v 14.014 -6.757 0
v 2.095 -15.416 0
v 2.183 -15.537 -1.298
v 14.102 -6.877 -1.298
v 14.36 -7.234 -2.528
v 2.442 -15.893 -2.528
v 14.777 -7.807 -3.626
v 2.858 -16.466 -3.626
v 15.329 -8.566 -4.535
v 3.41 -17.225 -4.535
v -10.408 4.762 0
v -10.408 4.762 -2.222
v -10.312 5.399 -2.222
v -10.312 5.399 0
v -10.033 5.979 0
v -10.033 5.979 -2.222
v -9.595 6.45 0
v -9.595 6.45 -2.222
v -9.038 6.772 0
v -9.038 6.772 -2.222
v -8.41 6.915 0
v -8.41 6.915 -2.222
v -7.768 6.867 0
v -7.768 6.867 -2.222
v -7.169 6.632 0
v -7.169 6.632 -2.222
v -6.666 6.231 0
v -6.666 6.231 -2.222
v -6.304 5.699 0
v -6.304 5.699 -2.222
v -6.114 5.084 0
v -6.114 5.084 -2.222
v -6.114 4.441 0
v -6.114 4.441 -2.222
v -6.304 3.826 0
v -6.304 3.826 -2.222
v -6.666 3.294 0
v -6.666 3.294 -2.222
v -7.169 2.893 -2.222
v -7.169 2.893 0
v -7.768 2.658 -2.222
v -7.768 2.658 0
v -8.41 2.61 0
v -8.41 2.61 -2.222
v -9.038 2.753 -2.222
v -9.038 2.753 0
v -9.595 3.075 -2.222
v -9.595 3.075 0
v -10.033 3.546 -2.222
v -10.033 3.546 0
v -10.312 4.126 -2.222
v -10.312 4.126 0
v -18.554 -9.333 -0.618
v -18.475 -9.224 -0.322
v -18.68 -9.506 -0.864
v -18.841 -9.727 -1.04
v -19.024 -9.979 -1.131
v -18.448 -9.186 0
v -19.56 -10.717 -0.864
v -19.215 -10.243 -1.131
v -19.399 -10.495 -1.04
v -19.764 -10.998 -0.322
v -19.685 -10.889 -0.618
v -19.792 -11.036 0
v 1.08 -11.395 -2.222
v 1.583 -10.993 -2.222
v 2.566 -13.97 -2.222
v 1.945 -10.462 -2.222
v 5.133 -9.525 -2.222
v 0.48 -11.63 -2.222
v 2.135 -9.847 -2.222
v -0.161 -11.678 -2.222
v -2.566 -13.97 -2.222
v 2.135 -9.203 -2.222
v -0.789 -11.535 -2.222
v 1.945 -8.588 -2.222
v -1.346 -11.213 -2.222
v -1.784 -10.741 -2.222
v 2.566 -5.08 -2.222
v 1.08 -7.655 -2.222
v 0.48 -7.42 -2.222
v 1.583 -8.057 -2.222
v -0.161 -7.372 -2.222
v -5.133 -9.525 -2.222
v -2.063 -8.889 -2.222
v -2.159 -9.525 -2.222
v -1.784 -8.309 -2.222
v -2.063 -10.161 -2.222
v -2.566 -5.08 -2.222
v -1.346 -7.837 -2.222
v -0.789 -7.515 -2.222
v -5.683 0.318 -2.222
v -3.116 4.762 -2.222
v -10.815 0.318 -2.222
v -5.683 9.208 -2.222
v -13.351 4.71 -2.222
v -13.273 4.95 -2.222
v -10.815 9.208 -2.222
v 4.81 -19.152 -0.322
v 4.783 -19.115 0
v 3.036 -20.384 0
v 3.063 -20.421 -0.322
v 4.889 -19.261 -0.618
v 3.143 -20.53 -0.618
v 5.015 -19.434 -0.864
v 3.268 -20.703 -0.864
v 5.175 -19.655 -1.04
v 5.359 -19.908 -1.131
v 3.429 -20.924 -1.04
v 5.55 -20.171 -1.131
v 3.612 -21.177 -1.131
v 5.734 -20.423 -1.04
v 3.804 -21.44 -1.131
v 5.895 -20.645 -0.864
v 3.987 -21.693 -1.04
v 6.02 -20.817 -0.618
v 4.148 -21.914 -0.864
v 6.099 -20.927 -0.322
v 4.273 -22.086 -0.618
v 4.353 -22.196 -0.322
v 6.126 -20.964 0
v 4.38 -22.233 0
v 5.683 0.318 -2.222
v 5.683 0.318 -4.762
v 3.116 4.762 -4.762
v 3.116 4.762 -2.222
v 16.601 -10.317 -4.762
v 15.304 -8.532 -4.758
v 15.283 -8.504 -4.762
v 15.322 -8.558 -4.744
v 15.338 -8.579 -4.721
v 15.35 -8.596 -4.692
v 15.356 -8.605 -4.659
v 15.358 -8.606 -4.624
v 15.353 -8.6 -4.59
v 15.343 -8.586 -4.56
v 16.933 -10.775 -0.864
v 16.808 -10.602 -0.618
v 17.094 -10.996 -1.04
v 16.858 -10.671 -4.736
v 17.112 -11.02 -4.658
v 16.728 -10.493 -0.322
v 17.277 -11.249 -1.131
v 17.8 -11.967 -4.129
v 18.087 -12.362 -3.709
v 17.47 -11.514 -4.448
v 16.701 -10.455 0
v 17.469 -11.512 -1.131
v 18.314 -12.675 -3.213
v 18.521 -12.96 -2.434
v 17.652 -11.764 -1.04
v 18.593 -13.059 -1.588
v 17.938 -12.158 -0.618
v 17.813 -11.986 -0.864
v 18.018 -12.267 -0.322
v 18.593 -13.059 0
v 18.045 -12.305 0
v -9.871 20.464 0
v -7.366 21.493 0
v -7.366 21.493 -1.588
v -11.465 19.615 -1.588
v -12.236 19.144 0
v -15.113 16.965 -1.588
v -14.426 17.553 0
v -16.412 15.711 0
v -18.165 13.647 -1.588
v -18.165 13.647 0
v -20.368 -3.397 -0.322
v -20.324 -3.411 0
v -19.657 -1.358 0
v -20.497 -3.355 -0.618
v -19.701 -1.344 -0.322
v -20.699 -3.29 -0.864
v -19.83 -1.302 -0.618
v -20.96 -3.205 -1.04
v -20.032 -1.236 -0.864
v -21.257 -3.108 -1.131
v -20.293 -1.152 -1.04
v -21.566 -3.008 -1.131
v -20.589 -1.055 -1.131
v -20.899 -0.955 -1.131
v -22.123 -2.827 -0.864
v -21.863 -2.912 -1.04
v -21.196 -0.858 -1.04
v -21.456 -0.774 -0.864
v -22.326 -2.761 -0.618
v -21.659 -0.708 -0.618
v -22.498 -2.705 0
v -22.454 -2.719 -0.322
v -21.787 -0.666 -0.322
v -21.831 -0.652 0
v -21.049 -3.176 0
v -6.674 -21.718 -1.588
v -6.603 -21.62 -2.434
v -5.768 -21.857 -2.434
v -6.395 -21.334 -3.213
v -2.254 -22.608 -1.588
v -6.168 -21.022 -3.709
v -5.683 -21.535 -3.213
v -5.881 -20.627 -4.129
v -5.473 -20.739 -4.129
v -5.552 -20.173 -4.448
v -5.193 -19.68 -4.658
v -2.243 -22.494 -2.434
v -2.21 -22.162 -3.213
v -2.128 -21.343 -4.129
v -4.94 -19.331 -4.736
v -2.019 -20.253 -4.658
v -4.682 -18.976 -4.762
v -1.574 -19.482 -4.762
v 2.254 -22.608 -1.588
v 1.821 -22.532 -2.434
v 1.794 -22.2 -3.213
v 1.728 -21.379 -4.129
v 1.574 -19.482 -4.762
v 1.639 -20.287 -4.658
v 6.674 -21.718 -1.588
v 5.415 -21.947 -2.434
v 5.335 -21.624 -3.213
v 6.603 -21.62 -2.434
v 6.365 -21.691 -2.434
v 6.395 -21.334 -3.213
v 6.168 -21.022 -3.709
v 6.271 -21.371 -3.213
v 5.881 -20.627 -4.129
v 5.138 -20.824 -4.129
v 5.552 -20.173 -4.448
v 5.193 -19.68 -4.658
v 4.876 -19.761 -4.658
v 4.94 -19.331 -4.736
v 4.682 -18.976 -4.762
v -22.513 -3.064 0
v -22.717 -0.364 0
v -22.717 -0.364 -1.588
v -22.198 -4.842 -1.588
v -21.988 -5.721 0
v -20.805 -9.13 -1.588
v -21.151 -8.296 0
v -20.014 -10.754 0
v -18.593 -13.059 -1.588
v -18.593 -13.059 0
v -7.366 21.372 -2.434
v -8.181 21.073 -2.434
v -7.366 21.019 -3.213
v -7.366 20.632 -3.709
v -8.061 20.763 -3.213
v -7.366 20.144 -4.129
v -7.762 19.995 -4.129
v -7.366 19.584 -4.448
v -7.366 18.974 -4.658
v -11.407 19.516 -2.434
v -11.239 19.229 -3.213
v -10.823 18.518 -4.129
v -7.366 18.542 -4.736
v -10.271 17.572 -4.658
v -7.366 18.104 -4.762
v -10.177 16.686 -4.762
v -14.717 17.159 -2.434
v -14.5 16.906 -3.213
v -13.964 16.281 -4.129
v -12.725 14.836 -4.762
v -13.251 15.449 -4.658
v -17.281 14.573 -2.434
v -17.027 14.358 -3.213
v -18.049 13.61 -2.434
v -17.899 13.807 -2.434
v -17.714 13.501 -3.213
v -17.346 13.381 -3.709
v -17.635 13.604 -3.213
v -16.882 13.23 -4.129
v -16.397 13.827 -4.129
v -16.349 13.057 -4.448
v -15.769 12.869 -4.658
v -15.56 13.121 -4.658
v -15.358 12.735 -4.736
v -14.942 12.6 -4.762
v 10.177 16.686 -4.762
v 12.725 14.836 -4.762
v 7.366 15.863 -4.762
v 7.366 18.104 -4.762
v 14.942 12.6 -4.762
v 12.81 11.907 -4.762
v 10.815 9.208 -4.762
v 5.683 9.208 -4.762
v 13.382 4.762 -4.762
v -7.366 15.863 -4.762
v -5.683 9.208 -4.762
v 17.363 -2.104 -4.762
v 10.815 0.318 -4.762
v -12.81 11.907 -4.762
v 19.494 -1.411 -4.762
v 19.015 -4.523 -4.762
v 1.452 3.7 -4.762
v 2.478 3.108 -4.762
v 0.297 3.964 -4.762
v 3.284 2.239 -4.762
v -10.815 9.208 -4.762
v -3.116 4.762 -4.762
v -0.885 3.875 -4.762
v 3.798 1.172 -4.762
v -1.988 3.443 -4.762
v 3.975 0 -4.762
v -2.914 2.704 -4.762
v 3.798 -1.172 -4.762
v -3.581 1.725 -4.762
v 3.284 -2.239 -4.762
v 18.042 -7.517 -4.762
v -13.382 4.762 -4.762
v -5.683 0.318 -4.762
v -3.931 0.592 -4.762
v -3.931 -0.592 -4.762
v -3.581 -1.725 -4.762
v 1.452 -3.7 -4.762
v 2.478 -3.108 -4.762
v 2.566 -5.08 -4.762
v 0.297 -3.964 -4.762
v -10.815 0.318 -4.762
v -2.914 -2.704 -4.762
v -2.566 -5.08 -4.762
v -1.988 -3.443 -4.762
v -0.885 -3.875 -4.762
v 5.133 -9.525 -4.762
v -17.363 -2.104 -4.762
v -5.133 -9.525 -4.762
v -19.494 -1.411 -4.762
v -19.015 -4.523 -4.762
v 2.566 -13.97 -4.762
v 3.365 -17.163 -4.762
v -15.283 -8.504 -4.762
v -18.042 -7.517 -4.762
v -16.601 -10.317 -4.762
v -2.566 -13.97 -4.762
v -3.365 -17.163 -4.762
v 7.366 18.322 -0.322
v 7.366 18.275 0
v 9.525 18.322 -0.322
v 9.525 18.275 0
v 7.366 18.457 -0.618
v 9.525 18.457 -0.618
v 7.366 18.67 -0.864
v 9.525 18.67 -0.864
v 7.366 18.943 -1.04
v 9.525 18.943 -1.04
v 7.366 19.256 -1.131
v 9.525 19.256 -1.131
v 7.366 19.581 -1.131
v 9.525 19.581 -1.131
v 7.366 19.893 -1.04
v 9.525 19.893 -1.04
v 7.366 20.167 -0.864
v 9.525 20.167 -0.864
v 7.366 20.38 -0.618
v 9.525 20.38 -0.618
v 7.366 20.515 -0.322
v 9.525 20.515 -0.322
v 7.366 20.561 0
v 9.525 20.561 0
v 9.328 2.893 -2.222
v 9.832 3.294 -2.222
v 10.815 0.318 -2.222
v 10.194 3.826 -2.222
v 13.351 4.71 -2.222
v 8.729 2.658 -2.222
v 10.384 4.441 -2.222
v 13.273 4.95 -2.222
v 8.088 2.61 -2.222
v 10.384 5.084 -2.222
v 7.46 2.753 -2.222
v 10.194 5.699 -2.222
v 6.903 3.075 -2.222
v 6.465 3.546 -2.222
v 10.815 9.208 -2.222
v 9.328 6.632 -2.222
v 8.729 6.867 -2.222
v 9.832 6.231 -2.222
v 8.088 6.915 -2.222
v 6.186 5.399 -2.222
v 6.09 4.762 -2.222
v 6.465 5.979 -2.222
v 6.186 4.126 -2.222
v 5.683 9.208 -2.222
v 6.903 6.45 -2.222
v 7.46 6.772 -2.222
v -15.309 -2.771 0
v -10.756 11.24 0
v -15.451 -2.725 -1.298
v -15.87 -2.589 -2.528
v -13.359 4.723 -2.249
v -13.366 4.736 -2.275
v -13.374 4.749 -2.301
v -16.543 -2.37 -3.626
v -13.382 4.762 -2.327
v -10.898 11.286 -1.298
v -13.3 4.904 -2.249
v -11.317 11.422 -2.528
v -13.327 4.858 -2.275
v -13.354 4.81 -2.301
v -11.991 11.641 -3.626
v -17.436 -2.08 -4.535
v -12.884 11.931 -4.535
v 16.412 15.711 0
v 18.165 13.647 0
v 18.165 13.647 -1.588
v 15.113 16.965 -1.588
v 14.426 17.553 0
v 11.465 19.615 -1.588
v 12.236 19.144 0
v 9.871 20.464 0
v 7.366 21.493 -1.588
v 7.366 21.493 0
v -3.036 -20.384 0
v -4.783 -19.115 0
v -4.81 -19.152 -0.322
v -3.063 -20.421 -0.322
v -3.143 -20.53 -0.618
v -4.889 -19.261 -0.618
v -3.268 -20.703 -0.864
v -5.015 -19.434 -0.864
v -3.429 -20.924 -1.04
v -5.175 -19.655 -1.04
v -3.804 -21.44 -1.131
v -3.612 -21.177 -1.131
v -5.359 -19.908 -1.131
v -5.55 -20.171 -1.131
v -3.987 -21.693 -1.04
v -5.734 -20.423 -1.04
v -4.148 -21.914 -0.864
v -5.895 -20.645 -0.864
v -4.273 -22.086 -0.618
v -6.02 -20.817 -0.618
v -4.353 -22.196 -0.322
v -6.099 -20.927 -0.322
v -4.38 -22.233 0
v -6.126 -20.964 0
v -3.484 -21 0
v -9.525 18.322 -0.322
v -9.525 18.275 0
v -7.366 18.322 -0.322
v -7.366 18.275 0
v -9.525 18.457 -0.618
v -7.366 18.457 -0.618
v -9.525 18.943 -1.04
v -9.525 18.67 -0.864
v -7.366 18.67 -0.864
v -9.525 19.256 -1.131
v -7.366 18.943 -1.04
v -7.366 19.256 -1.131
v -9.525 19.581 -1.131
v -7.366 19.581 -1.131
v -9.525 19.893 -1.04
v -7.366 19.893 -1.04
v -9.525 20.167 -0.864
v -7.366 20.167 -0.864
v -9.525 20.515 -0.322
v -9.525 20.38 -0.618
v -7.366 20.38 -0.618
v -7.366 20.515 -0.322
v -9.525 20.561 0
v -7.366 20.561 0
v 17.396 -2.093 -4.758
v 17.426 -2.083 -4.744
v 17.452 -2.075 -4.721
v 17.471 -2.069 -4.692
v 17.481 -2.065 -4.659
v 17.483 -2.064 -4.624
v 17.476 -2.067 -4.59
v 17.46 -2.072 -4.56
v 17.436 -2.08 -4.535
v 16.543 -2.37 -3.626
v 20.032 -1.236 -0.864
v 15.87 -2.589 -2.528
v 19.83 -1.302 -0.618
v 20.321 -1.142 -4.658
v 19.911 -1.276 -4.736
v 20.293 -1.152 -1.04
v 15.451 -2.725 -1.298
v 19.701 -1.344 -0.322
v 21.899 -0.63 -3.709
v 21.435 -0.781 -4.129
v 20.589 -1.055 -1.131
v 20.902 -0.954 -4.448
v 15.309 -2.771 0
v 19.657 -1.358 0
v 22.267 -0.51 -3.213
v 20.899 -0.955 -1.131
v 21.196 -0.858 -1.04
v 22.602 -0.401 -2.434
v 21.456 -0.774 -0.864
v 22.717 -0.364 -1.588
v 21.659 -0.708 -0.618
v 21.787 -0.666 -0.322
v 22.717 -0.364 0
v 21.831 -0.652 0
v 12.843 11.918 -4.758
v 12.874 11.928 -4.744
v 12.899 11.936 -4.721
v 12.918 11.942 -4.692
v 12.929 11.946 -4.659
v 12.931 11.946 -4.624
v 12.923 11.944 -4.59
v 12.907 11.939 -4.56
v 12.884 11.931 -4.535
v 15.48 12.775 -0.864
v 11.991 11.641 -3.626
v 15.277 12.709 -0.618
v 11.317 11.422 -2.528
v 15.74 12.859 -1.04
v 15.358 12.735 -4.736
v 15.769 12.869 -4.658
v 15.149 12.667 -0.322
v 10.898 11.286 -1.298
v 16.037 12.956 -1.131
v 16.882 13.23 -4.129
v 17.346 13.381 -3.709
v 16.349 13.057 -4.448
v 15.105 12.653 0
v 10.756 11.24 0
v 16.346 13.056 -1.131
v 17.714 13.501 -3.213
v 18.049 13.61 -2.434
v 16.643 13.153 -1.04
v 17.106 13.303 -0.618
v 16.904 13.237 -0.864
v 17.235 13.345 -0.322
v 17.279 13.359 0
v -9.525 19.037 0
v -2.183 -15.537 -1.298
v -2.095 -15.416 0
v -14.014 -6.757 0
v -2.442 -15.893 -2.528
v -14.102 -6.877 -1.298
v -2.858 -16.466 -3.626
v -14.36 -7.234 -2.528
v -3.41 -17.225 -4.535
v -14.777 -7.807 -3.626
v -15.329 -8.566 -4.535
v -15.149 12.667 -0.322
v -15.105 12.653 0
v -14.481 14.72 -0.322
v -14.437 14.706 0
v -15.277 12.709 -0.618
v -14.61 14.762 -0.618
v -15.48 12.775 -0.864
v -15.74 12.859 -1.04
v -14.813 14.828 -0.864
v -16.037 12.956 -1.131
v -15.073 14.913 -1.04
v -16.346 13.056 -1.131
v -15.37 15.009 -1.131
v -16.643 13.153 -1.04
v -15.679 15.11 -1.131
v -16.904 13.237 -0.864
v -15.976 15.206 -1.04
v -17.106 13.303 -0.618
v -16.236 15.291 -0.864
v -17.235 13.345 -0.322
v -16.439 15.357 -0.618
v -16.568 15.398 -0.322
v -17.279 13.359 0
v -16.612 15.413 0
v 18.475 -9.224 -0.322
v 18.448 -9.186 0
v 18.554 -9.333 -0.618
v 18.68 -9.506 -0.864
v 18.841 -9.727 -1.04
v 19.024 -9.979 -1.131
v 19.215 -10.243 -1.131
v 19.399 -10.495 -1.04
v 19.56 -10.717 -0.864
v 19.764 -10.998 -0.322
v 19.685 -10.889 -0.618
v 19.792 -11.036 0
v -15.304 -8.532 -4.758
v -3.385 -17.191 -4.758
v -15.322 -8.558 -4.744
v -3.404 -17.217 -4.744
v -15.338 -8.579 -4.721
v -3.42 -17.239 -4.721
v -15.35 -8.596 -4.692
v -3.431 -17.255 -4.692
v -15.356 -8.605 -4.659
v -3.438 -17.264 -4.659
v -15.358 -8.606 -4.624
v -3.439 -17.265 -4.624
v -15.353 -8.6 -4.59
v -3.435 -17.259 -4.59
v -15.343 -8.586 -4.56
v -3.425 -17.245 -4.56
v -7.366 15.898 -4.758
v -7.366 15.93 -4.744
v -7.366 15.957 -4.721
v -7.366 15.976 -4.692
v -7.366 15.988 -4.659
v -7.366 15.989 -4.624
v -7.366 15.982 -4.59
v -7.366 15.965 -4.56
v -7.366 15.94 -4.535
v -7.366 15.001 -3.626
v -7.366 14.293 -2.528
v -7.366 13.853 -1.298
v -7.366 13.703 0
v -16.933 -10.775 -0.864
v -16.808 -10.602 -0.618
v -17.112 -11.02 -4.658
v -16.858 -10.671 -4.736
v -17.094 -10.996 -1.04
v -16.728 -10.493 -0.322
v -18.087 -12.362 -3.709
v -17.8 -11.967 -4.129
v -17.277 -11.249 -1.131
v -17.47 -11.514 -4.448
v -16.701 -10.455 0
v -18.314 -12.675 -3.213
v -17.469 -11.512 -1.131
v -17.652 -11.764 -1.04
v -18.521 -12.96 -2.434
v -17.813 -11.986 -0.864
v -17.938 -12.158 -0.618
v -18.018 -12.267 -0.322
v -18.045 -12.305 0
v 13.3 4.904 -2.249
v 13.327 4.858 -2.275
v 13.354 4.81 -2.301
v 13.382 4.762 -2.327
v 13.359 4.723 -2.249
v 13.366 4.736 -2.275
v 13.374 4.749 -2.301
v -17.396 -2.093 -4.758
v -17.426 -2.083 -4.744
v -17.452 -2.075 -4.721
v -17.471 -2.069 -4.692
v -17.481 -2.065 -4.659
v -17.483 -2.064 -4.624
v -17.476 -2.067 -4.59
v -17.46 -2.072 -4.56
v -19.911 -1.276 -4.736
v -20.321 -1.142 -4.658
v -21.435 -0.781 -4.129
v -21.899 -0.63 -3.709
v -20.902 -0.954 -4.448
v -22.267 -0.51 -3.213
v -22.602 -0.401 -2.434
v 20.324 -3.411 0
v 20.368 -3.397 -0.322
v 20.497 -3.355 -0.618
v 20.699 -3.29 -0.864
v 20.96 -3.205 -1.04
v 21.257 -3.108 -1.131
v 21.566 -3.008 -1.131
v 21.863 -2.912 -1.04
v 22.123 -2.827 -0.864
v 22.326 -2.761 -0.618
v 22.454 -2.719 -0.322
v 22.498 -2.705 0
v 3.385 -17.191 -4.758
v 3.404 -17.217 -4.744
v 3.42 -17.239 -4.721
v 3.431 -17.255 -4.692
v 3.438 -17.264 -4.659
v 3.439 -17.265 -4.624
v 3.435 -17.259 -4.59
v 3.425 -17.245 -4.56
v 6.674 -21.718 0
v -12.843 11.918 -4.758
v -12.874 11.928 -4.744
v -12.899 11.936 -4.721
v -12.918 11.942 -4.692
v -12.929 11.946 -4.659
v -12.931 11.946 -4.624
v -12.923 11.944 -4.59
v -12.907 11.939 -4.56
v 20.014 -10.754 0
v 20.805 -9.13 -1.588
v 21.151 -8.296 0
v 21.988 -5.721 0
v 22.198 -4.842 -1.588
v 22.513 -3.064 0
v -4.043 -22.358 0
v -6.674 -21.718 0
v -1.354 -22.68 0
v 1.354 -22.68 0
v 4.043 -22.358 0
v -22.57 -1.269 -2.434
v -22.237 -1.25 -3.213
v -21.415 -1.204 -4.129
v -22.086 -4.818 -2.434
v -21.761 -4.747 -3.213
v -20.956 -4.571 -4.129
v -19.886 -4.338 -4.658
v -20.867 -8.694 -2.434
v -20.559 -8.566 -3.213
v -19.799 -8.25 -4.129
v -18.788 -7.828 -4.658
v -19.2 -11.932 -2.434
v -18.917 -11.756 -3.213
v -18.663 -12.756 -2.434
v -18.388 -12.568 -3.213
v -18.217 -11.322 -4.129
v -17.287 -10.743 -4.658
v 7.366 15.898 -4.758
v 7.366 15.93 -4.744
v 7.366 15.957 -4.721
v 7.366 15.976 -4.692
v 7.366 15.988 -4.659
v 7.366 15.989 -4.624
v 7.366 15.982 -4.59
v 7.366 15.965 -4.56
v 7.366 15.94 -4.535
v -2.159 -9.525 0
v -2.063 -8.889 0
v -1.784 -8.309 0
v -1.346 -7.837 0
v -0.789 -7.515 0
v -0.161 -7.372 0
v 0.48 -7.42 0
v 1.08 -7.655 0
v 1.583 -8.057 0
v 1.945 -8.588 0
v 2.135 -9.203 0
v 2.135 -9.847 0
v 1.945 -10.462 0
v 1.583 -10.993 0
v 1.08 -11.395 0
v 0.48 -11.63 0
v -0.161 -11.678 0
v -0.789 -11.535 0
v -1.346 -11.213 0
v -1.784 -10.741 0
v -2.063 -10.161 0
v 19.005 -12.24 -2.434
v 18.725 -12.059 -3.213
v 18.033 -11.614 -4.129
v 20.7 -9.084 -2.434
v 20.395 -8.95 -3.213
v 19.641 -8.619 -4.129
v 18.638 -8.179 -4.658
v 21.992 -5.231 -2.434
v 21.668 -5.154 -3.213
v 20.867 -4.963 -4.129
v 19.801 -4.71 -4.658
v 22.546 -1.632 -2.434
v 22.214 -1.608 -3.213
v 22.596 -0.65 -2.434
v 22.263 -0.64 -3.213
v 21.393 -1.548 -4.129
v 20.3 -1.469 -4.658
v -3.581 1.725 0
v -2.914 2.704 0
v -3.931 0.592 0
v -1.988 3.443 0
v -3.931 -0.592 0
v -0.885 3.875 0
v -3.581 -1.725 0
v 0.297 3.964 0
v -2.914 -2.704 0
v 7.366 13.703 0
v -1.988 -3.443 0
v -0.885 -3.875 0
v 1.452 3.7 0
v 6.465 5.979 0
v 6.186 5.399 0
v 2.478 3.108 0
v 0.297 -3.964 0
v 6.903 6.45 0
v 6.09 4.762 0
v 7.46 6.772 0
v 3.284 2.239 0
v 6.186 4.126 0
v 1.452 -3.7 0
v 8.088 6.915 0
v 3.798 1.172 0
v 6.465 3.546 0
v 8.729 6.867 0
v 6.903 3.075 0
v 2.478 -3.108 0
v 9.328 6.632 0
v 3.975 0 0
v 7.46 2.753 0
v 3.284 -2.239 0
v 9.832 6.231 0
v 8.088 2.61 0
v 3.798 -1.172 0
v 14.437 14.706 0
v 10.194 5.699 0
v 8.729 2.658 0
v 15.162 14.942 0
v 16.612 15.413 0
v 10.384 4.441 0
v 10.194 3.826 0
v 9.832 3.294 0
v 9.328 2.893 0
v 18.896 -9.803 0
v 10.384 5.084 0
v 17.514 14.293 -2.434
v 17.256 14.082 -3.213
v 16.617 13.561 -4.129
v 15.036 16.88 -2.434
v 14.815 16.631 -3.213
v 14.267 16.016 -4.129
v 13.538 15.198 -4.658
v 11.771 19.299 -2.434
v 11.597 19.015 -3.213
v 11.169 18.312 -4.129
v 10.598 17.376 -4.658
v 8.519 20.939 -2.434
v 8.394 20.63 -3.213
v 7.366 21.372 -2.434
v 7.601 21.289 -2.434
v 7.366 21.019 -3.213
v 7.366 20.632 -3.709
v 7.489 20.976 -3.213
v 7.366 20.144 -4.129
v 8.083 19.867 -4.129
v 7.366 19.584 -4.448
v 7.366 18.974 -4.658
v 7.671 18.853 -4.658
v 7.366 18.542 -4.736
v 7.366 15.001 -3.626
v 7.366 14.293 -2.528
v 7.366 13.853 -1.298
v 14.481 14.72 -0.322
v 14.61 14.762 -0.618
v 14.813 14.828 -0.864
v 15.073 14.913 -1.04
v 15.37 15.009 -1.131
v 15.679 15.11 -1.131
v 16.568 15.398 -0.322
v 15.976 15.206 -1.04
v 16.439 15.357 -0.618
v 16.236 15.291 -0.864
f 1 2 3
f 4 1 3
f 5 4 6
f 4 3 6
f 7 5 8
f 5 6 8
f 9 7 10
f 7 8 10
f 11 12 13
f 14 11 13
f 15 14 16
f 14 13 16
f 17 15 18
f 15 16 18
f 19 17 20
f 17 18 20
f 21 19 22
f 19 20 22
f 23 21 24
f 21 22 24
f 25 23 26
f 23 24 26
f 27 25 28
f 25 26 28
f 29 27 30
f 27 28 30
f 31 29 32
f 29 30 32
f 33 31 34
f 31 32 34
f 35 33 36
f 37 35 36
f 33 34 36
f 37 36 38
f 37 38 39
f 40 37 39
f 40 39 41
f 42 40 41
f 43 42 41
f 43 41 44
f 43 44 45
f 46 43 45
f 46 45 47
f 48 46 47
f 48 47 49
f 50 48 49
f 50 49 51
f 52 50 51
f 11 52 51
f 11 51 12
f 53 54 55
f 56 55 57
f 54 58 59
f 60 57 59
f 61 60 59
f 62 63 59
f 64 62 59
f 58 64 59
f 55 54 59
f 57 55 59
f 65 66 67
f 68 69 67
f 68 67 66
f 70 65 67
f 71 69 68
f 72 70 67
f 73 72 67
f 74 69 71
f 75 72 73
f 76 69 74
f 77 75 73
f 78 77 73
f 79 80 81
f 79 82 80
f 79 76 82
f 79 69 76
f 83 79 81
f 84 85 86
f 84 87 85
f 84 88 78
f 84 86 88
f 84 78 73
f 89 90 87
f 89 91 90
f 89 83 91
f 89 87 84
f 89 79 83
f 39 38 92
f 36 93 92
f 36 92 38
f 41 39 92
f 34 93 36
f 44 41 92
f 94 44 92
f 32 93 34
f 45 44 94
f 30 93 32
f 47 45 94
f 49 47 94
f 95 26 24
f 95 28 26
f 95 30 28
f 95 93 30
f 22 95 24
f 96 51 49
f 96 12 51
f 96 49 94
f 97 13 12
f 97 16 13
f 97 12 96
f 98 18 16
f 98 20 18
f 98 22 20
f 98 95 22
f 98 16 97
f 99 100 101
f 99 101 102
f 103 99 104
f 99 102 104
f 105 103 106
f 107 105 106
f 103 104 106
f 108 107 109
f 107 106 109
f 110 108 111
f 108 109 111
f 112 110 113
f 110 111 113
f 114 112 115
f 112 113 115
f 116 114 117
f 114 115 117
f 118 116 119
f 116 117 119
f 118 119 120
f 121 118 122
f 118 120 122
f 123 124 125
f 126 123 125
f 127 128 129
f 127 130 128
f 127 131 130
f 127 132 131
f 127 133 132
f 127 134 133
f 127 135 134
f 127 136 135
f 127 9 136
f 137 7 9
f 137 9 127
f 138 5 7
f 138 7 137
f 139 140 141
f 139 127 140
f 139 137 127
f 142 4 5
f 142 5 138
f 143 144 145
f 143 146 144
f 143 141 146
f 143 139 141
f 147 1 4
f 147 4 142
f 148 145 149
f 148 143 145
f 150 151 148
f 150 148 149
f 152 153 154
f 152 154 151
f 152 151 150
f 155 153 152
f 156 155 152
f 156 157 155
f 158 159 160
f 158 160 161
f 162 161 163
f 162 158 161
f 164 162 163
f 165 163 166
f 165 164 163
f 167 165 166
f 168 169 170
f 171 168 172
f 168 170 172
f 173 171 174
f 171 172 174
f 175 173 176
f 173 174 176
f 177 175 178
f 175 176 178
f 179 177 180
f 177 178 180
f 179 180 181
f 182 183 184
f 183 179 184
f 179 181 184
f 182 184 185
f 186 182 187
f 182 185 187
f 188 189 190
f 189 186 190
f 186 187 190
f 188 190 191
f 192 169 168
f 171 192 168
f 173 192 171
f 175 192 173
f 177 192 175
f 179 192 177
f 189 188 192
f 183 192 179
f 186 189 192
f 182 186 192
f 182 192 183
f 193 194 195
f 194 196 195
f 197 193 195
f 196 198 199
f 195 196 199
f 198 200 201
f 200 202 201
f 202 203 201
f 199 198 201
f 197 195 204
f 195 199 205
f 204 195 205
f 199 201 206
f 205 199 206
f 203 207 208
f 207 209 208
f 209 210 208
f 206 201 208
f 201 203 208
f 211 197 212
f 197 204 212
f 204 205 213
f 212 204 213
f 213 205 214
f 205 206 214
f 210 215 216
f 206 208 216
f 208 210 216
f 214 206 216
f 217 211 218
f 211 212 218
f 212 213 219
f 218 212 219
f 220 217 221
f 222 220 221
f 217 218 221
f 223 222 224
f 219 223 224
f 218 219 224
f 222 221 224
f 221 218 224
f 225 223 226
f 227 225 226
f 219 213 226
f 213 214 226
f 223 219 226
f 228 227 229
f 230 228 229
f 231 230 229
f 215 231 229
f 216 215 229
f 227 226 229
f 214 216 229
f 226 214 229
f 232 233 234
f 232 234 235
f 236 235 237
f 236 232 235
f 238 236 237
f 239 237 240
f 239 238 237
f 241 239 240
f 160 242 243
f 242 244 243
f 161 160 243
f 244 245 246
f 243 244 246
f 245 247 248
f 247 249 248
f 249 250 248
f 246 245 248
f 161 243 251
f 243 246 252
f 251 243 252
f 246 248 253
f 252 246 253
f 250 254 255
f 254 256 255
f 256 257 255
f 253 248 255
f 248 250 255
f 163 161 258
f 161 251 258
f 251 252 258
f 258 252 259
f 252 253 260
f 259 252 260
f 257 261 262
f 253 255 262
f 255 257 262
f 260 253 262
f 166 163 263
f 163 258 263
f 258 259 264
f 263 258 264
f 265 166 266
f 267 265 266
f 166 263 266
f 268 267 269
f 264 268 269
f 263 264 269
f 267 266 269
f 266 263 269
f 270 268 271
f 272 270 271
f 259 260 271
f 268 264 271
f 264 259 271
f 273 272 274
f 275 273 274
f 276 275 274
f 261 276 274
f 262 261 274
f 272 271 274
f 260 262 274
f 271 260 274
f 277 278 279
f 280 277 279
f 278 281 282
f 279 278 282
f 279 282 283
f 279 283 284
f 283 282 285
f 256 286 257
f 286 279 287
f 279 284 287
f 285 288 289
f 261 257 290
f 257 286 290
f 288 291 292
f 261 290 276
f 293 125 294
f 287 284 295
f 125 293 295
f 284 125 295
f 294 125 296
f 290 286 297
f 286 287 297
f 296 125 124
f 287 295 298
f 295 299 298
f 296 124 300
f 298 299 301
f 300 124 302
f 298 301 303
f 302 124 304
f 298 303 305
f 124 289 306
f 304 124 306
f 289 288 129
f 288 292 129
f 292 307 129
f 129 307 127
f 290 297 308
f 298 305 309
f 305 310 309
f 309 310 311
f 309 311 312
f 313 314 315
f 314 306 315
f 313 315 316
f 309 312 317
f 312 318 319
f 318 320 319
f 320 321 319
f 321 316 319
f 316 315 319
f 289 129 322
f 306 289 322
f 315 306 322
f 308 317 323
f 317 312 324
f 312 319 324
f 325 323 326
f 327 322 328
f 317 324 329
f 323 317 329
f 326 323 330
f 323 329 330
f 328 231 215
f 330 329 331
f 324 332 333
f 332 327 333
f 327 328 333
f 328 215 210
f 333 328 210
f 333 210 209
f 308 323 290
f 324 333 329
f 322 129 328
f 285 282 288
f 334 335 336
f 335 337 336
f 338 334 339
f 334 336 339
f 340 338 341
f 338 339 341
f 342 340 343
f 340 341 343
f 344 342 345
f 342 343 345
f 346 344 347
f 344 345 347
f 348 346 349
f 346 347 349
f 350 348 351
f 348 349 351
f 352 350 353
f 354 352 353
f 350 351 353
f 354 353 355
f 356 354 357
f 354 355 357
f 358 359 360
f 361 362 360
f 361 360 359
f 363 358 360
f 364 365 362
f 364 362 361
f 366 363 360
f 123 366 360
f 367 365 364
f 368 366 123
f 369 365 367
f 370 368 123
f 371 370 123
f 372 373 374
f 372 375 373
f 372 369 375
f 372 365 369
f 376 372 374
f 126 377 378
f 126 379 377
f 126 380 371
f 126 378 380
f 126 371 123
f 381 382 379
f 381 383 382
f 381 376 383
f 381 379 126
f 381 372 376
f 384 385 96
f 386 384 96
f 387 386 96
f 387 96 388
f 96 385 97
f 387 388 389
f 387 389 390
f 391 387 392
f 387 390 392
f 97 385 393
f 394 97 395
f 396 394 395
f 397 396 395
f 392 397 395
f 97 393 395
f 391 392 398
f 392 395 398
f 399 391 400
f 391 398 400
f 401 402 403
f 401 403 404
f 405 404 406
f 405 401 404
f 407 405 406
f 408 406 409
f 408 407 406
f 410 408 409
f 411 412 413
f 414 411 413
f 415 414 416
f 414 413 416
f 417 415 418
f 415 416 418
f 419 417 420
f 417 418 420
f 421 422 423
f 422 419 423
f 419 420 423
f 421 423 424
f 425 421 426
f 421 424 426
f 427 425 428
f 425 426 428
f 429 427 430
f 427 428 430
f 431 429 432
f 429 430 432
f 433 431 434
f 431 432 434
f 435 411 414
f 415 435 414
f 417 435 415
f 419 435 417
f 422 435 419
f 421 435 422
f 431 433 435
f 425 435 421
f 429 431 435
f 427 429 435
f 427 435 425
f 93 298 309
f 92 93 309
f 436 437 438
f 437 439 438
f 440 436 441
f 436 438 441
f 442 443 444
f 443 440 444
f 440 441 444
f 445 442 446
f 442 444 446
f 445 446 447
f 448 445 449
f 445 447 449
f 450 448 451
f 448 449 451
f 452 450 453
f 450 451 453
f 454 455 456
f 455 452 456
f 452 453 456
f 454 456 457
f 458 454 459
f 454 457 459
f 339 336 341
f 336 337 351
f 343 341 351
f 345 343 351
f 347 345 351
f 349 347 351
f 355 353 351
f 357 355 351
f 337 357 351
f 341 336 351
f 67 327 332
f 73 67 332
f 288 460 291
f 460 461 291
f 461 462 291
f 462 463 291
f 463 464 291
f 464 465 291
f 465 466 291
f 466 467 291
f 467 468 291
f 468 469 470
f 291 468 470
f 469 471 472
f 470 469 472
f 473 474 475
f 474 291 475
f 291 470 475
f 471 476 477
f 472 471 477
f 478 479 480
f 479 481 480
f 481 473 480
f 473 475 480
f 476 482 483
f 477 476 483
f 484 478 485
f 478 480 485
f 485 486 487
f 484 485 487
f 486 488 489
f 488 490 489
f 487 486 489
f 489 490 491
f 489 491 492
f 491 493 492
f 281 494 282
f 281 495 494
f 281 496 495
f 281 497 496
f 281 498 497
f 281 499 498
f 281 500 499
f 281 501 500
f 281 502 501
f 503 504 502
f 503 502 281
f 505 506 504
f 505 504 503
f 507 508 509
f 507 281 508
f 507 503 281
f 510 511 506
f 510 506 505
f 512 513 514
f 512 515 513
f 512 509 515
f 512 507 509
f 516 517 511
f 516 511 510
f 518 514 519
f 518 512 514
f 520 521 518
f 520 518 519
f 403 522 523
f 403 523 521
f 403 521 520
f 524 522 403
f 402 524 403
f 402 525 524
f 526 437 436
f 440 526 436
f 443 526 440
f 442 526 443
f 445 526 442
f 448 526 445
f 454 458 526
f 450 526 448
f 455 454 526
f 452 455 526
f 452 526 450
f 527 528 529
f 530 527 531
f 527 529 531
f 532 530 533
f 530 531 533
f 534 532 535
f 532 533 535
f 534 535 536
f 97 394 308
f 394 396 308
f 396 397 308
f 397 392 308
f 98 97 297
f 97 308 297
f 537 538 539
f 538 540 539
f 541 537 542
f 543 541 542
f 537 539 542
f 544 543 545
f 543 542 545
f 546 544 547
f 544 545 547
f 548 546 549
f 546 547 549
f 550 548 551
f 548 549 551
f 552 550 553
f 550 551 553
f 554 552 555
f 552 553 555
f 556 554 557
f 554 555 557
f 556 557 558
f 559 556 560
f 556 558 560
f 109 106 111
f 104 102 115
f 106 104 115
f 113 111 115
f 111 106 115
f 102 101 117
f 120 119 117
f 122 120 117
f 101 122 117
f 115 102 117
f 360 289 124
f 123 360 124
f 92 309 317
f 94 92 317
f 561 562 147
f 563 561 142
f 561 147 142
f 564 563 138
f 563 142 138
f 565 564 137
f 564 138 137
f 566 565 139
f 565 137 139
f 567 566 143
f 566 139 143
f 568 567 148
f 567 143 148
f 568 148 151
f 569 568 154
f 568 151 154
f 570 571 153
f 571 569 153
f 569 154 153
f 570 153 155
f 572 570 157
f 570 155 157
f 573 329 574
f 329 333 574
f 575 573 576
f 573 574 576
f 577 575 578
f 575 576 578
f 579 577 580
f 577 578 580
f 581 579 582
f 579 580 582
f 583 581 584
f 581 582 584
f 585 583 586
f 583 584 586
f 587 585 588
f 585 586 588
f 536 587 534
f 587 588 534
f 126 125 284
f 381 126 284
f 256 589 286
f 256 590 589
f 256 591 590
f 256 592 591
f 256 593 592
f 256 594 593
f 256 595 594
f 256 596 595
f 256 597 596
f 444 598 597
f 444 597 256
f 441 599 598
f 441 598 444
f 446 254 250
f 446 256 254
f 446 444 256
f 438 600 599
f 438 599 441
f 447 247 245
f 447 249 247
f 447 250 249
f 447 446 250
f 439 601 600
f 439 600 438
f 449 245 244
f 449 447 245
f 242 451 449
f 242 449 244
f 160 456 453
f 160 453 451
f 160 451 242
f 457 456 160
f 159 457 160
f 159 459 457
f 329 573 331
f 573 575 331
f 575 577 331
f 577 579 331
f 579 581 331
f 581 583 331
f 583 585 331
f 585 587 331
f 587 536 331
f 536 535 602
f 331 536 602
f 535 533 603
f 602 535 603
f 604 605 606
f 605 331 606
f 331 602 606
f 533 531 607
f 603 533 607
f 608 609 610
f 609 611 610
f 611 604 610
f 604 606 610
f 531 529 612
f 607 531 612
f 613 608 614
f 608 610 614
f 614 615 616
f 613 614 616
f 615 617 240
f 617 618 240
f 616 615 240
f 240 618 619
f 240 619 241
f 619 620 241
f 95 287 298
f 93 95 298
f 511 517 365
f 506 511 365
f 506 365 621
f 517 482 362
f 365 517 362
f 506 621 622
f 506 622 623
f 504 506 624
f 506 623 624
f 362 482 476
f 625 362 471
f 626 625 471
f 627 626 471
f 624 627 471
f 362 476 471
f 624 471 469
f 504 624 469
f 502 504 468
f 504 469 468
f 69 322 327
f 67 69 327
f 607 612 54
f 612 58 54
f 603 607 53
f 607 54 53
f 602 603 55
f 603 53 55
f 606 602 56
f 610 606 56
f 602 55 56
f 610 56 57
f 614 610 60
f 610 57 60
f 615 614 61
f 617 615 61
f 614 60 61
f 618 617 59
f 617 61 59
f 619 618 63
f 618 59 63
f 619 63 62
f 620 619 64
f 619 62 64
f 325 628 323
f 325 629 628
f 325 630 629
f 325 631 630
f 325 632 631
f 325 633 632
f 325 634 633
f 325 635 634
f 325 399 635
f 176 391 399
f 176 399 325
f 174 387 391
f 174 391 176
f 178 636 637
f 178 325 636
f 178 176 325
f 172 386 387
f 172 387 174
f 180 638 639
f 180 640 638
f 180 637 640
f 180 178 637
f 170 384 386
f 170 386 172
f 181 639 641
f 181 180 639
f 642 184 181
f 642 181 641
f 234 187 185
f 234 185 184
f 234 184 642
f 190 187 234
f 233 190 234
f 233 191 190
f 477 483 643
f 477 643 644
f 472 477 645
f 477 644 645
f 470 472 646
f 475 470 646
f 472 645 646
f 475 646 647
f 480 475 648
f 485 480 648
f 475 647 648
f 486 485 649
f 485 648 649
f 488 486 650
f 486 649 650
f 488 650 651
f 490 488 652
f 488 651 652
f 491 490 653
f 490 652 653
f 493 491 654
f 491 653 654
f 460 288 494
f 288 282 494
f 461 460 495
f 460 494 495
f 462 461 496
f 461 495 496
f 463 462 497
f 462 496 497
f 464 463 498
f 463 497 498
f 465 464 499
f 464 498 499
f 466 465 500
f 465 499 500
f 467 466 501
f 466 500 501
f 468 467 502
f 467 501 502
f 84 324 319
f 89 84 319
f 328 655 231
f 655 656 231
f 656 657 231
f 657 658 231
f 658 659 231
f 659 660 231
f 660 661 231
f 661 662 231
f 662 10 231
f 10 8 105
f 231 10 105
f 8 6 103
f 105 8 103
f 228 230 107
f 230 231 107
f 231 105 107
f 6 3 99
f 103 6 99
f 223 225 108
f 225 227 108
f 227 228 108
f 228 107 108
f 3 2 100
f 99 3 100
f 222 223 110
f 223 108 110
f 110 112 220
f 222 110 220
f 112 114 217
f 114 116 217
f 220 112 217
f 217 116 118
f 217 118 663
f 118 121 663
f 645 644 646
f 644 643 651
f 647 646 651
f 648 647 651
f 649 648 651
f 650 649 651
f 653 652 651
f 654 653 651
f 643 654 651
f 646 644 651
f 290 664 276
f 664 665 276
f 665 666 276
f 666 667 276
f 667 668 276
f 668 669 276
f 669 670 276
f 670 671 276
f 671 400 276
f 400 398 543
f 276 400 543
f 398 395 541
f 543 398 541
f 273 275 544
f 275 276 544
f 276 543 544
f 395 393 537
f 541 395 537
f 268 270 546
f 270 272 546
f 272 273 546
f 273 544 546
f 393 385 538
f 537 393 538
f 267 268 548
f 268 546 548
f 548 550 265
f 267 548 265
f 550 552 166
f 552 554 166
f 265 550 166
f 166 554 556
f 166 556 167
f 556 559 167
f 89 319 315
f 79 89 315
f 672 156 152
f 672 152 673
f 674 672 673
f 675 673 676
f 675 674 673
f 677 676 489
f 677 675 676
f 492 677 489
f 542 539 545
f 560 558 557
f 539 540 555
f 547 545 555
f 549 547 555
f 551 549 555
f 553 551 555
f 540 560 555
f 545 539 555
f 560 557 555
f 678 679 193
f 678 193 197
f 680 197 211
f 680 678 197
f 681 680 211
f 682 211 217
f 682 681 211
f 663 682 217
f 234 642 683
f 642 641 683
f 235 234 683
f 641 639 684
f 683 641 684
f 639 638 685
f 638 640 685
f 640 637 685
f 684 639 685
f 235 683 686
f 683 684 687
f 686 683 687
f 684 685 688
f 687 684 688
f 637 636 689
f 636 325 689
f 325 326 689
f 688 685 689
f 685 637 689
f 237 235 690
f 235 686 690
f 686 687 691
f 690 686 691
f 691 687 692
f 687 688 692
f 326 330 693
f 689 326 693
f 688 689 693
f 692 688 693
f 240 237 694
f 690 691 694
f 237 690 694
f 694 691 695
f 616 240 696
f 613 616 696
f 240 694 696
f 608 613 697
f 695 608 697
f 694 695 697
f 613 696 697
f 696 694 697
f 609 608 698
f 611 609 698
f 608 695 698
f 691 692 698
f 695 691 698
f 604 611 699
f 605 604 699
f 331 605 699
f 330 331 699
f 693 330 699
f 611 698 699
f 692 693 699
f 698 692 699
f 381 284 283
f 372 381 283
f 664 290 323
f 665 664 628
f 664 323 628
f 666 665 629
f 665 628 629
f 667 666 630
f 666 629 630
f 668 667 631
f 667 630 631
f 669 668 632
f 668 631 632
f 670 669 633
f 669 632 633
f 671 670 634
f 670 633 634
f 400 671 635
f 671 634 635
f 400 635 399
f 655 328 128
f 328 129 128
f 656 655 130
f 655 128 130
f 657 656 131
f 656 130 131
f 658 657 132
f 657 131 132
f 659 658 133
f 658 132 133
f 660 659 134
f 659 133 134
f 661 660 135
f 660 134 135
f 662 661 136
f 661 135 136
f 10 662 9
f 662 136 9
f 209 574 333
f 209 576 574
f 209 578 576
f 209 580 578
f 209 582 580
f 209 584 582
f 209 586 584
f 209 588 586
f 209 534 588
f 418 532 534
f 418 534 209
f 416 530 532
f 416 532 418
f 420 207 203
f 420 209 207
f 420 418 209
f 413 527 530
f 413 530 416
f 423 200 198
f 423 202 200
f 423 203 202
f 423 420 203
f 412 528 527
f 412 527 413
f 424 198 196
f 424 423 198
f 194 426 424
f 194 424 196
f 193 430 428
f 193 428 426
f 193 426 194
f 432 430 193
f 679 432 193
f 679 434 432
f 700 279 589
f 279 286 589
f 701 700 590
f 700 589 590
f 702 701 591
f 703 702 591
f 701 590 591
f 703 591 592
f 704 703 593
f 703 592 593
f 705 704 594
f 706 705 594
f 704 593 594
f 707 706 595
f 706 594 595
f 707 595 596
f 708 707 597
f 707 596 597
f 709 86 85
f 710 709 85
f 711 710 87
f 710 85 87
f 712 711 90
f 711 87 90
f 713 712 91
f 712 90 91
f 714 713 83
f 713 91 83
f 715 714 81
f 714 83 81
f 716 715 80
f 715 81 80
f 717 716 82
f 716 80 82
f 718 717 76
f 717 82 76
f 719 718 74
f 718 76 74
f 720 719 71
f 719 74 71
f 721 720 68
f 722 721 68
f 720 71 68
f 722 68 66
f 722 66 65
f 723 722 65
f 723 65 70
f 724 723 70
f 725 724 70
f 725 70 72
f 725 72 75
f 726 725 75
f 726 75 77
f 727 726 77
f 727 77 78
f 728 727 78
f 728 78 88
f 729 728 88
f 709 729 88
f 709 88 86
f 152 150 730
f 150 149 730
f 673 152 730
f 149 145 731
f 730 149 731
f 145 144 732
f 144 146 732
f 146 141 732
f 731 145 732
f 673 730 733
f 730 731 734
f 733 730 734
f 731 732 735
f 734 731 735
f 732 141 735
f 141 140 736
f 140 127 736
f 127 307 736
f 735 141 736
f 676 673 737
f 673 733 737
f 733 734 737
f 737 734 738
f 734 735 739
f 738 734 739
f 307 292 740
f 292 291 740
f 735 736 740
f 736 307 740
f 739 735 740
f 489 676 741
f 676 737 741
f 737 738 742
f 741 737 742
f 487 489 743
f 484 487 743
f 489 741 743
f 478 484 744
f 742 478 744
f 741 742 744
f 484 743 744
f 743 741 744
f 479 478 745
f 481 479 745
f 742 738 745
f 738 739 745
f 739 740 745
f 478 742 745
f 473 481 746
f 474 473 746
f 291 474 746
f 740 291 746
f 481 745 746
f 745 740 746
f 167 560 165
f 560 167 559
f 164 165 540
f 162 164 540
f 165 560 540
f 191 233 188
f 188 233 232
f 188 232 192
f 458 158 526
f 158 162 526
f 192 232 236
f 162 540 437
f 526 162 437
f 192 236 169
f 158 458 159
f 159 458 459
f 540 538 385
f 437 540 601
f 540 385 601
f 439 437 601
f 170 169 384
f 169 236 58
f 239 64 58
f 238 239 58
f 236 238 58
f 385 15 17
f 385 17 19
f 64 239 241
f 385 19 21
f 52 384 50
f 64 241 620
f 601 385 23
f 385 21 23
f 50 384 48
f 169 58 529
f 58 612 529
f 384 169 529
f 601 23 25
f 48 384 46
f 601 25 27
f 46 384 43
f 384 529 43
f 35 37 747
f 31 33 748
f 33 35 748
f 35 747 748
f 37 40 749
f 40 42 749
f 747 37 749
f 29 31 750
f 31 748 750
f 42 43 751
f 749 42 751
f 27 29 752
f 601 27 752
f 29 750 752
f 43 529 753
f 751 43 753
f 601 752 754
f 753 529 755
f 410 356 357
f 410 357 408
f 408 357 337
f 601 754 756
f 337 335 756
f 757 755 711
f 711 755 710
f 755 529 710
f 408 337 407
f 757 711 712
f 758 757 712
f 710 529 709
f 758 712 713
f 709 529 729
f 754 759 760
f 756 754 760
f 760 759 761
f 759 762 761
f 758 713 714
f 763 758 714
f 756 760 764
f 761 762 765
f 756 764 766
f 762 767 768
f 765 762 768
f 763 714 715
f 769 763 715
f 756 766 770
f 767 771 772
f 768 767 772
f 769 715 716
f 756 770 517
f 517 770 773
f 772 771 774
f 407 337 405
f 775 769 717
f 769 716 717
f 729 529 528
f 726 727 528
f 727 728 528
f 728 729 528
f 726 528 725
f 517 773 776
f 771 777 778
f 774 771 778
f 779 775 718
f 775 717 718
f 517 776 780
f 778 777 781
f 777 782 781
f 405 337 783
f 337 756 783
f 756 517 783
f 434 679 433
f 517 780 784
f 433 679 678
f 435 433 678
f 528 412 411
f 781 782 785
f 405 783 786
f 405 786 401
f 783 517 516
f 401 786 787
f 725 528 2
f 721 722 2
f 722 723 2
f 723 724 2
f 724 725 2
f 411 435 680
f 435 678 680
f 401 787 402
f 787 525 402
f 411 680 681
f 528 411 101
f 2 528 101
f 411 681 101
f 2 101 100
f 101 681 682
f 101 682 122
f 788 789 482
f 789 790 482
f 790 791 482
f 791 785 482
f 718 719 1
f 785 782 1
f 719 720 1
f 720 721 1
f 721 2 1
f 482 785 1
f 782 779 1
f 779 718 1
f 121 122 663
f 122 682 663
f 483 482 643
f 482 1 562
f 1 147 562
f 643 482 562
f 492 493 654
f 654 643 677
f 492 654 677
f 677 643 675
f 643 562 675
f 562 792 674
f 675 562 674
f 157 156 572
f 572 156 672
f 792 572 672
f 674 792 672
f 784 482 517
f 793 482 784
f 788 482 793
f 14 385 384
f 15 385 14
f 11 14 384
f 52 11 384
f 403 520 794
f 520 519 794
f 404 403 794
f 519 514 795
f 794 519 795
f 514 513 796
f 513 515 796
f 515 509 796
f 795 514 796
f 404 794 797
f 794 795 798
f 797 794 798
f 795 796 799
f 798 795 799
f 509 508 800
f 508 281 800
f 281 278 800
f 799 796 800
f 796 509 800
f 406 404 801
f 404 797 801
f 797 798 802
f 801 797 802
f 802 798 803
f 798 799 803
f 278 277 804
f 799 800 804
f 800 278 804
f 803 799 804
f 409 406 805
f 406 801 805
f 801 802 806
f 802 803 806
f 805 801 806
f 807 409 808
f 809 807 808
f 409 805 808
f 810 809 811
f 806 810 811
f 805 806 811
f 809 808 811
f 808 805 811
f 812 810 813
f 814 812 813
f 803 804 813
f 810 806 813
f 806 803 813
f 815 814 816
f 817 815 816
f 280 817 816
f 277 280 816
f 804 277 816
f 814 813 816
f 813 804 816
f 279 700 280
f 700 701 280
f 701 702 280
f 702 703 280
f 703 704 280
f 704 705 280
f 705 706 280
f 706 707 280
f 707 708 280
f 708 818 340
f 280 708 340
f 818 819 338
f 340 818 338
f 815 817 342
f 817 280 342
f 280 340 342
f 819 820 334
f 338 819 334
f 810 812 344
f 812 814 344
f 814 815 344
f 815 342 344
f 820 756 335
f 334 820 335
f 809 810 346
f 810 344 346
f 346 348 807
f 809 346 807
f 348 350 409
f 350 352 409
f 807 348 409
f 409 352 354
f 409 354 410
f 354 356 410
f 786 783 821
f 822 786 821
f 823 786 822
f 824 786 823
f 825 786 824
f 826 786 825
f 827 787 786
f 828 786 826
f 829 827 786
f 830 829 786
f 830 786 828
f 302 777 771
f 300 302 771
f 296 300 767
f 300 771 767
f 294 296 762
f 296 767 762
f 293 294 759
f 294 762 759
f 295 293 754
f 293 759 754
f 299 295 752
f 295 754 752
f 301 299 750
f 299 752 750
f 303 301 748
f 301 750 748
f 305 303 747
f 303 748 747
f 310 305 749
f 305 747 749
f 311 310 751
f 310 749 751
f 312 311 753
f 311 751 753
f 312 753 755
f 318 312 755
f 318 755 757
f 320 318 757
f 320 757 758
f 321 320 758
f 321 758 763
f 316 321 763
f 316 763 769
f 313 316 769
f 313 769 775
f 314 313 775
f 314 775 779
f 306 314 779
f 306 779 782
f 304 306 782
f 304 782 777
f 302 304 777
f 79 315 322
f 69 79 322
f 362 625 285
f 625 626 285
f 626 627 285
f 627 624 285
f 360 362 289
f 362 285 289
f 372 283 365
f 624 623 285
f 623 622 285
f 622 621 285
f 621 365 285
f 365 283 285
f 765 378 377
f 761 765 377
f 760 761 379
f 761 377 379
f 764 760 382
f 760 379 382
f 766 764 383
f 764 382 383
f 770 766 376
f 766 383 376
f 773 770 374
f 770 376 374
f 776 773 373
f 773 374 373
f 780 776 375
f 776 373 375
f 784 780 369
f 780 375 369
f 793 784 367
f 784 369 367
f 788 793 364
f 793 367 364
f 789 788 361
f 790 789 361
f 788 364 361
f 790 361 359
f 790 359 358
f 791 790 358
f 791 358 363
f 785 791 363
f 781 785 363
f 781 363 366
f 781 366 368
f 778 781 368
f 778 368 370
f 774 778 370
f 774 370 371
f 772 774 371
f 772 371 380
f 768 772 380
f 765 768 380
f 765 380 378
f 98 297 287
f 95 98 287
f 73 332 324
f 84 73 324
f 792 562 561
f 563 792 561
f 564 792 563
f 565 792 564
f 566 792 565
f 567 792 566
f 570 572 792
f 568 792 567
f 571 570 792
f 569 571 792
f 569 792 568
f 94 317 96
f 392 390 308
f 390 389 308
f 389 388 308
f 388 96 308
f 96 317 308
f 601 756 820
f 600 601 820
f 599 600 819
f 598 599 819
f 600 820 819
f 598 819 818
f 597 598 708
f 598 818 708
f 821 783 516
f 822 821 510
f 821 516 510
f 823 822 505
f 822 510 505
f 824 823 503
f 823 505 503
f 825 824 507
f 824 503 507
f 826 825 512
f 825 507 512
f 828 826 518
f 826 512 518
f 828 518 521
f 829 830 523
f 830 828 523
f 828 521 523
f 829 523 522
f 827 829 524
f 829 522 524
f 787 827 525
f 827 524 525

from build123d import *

# Parameters (mm, degrees)
SKETCH1_R                = 22.7203
BOSS_EXTRUDE2_DEPTH      = 4.7625
FILLET1_R                = 3.175
SKETCH2_W                = 14.732
SKETCH2_H                = 10.414
CUT_EXTRUDE2_DEPTH       = 12.7
CIRPATTERN1_COUNT        = 5
SKETCH4_R                = 1.143
CUT_EXTRUDE4_DEPTH       = 9.525
CIRPATTERN2_COUNT        = 5
SKETCH5_R                = 3.9751
CUT_EXTRUDE5_DEPTH       = 33.480350535
SKETCH6_R                = 2.159
CUT_EXTRUDE7_DEPTH       = 33.480350535
BOSS_EXTRUDE4_REACH      = 39.999
FILLET2_R                = 0.127
CIRPATTERN5_COUNT        = 5
FILLET2_OF_CIRPATTERN5_R = 0.127
CUT_EXTRUDE8_DEPTH       = 2.54


with BuildPart() as part:
    # Sketch1 → Boss-Extrude2 (new body)
    with BuildSketch(Plane.XY):
        Circle(SKETCH1_R)
    extrude(amount=-BOSS_EXTRUDE2_DEPTH)

    # Fillet1
    fillet1_edges = [part.edges().sort_by_distance(p)[0] for p in [
        (-22.7203, 0, -4.7625),
    ]]
    fillet(fillet1_edges, radius=FILLET1_R)

    # Sketch2 → Cut-Extrude2 (cut)
    with BuildSketch(Plane.XY):
        with Locations((0, 18.7833)):
            Rectangle(SKETCH2_W, SKETCH2_H)
    cut_extrude2 = extrude(amount=-CUT_EXTRUDE2_DEPTH, mode=Mode.SUBTRACT)

    # CirPattern1: Cut-Extrude2 ×5 about axis
    cirpattern1_axis = Axis((0, 0, 0), (0, 0, 1))
    for i in range(1, CIRPATTERN1_COUNT):
        add(cut_extrude2.rotate(cirpattern1_axis, i * 360 / CIRPATTERN1_COUNT), mode=Mode.SUBTRACT)

    # Sketch4 → Cut-Extrude4 (cut, symmetric)
    with BuildSketch(Plane(origin=(0, 0, 0), x_dir=(0, 0, -1), z_dir=(1, 0, 0))):
        with Locations((0, 19.4183)):
            Circle(SKETCH4_R)
    cut_extrude4 = extrude(amount=CUT_EXTRUDE4_DEPTH, both=True, mode=Mode.SUBTRACT)

    # CirPattern2: Cut-Extrude4 ×5 about axis
    cirpattern2_axis = Axis((0, 0, 0), (0, 0, 1))
    for i in range(1, CIRPATTERN2_COUNT):
        add(cut_extrude4.rotate(cirpattern2_axis, i * 360 / CIRPATTERN2_COUNT), mode=Mode.SUBTRACT)

    # Sketch5 → Cut-Extrude5 (cut, through all)
    with BuildSketch(Plane.XY):
        Circle(SKETCH5_R)
    extrude(amount=-CUT_EXTRUDE5_DEPTH, mode=Mode.SUBTRACT)

    # Sketch6 → Cut-Extrude7 (cut, through all)
    with BuildSketch(Plane(origin=(0, 0, -4.7625), x_dir=(-1, 0, 0), z_dir=(0, 0, -1))):
        with Locations((0, -9.525)):
            Circle(SKETCH6_R)
        with Locations((-8.248891971, 4.7625)):
            Circle(SKETCH6_R)
        with Locations((8.248891971, 4.7625)):
            Circle(SKETCH6_R)
    extrude(amount=-CUT_EXTRUDE7_DEPTH, mode=Mode.SUBTRACT)

    # Sketch10 → Boss-Extrude4 (add, up to next)
    with BuildSketch(Plane.ZY.offset(-7.366), mode=Mode.PRIVATE) as boss_extrude4_sk1:
        with BuildLine():
            Line((-4.7625, 13.5763), (0, 13.5763))
            Line((0, 13.5763), (0, 13.7033))
            ThreePointArc((0, 13.7033), (-2.7025038, 14.38265722), (-4.7625, 16.259214887))
            Line((-4.7625, 16.259214887), (-4.7625, 13.5763))
        make_face()
    boss_extrude4_tool1 = extrude(boss_extrude4_sk1.sketch, amount=BOSS_EXTRUDE4_REACH, mode=Mode.PRIVATE) - part.part
    boss_extrude4 = boss_extrude4_tool1.solids().sort_by_distance((7.366, 14.314807, -3.452063))[0]
    add(boss_extrude4)

    # Fillet2
    fillet2_edges = [part.edges().sort_by_distance(p)[0] for p in [
        (0, 16.259214887, -4.7625),
    ]]
    fillet(fillet2_edges, radius=FILLET2_R)

    # CirPattern5: Boss-Extrude4 ×5 about axis
    cirpattern5_axis = Axis((0, 0, 0), (0, 0, 1))
    for i in range(1, CIRPATTERN5_COUNT):
        add(boss_extrude4.rotate(cirpattern5_axis, i * 360 / CIRPATTERN5_COUNT))

    # Fillet2 of CirPattern5
    fillet2_of_cirpattern5_edges = [part.edges().sort_by_distance(p)[0] for p in [
        (-15.463432268, 5.024373715, -4.7625),
        (-9.556926725, -13.153981159, -4.7625),
        (9.556926725, -13.153981159, -4.7625),
        (15.463432268, 5.024373715, -4.7625),
    ]]
    fillet(fillet2_of_cirpattern5_edges, radius=FILLET2_OF_CIRPATTERN5_R)

    # Sketch7 → Cut-Extrude8 (cut)
    with BuildSketch(Plane(origin=(0, 0, -4.7625), x_dir=(-1, 0, 0), z_dir=(0, 0, -1))):
        Polygon((-10.815213918, 0.3175), (-5.682570024, 0.3175), (-3.116248078, 4.7625), (-5.682570024, 9.2075), (-10.815213918, 9.2075), (-13.381535864, 4.7625), align=None)
        Polygon((5.132643893, -9.525), (2.566321947, -5.08), (-2.566321947, -5.08), (-5.132643893, -9.525), (-2.566321947, -13.97), (2.566321947, -13.97), align=None)
        Polygon((5.682570024, 9.2075), (3.116248078, 4.7625), (5.682570024, 0.3175), (10.815213918, 0.3175), (13.381535864, 4.7625), (10.815213918, 9.2075), align=None)
    extrude(amount=-CUT_EXTRUDE8_DEPTH, mode=Mode.SUBTRACT)


solid = part.part
